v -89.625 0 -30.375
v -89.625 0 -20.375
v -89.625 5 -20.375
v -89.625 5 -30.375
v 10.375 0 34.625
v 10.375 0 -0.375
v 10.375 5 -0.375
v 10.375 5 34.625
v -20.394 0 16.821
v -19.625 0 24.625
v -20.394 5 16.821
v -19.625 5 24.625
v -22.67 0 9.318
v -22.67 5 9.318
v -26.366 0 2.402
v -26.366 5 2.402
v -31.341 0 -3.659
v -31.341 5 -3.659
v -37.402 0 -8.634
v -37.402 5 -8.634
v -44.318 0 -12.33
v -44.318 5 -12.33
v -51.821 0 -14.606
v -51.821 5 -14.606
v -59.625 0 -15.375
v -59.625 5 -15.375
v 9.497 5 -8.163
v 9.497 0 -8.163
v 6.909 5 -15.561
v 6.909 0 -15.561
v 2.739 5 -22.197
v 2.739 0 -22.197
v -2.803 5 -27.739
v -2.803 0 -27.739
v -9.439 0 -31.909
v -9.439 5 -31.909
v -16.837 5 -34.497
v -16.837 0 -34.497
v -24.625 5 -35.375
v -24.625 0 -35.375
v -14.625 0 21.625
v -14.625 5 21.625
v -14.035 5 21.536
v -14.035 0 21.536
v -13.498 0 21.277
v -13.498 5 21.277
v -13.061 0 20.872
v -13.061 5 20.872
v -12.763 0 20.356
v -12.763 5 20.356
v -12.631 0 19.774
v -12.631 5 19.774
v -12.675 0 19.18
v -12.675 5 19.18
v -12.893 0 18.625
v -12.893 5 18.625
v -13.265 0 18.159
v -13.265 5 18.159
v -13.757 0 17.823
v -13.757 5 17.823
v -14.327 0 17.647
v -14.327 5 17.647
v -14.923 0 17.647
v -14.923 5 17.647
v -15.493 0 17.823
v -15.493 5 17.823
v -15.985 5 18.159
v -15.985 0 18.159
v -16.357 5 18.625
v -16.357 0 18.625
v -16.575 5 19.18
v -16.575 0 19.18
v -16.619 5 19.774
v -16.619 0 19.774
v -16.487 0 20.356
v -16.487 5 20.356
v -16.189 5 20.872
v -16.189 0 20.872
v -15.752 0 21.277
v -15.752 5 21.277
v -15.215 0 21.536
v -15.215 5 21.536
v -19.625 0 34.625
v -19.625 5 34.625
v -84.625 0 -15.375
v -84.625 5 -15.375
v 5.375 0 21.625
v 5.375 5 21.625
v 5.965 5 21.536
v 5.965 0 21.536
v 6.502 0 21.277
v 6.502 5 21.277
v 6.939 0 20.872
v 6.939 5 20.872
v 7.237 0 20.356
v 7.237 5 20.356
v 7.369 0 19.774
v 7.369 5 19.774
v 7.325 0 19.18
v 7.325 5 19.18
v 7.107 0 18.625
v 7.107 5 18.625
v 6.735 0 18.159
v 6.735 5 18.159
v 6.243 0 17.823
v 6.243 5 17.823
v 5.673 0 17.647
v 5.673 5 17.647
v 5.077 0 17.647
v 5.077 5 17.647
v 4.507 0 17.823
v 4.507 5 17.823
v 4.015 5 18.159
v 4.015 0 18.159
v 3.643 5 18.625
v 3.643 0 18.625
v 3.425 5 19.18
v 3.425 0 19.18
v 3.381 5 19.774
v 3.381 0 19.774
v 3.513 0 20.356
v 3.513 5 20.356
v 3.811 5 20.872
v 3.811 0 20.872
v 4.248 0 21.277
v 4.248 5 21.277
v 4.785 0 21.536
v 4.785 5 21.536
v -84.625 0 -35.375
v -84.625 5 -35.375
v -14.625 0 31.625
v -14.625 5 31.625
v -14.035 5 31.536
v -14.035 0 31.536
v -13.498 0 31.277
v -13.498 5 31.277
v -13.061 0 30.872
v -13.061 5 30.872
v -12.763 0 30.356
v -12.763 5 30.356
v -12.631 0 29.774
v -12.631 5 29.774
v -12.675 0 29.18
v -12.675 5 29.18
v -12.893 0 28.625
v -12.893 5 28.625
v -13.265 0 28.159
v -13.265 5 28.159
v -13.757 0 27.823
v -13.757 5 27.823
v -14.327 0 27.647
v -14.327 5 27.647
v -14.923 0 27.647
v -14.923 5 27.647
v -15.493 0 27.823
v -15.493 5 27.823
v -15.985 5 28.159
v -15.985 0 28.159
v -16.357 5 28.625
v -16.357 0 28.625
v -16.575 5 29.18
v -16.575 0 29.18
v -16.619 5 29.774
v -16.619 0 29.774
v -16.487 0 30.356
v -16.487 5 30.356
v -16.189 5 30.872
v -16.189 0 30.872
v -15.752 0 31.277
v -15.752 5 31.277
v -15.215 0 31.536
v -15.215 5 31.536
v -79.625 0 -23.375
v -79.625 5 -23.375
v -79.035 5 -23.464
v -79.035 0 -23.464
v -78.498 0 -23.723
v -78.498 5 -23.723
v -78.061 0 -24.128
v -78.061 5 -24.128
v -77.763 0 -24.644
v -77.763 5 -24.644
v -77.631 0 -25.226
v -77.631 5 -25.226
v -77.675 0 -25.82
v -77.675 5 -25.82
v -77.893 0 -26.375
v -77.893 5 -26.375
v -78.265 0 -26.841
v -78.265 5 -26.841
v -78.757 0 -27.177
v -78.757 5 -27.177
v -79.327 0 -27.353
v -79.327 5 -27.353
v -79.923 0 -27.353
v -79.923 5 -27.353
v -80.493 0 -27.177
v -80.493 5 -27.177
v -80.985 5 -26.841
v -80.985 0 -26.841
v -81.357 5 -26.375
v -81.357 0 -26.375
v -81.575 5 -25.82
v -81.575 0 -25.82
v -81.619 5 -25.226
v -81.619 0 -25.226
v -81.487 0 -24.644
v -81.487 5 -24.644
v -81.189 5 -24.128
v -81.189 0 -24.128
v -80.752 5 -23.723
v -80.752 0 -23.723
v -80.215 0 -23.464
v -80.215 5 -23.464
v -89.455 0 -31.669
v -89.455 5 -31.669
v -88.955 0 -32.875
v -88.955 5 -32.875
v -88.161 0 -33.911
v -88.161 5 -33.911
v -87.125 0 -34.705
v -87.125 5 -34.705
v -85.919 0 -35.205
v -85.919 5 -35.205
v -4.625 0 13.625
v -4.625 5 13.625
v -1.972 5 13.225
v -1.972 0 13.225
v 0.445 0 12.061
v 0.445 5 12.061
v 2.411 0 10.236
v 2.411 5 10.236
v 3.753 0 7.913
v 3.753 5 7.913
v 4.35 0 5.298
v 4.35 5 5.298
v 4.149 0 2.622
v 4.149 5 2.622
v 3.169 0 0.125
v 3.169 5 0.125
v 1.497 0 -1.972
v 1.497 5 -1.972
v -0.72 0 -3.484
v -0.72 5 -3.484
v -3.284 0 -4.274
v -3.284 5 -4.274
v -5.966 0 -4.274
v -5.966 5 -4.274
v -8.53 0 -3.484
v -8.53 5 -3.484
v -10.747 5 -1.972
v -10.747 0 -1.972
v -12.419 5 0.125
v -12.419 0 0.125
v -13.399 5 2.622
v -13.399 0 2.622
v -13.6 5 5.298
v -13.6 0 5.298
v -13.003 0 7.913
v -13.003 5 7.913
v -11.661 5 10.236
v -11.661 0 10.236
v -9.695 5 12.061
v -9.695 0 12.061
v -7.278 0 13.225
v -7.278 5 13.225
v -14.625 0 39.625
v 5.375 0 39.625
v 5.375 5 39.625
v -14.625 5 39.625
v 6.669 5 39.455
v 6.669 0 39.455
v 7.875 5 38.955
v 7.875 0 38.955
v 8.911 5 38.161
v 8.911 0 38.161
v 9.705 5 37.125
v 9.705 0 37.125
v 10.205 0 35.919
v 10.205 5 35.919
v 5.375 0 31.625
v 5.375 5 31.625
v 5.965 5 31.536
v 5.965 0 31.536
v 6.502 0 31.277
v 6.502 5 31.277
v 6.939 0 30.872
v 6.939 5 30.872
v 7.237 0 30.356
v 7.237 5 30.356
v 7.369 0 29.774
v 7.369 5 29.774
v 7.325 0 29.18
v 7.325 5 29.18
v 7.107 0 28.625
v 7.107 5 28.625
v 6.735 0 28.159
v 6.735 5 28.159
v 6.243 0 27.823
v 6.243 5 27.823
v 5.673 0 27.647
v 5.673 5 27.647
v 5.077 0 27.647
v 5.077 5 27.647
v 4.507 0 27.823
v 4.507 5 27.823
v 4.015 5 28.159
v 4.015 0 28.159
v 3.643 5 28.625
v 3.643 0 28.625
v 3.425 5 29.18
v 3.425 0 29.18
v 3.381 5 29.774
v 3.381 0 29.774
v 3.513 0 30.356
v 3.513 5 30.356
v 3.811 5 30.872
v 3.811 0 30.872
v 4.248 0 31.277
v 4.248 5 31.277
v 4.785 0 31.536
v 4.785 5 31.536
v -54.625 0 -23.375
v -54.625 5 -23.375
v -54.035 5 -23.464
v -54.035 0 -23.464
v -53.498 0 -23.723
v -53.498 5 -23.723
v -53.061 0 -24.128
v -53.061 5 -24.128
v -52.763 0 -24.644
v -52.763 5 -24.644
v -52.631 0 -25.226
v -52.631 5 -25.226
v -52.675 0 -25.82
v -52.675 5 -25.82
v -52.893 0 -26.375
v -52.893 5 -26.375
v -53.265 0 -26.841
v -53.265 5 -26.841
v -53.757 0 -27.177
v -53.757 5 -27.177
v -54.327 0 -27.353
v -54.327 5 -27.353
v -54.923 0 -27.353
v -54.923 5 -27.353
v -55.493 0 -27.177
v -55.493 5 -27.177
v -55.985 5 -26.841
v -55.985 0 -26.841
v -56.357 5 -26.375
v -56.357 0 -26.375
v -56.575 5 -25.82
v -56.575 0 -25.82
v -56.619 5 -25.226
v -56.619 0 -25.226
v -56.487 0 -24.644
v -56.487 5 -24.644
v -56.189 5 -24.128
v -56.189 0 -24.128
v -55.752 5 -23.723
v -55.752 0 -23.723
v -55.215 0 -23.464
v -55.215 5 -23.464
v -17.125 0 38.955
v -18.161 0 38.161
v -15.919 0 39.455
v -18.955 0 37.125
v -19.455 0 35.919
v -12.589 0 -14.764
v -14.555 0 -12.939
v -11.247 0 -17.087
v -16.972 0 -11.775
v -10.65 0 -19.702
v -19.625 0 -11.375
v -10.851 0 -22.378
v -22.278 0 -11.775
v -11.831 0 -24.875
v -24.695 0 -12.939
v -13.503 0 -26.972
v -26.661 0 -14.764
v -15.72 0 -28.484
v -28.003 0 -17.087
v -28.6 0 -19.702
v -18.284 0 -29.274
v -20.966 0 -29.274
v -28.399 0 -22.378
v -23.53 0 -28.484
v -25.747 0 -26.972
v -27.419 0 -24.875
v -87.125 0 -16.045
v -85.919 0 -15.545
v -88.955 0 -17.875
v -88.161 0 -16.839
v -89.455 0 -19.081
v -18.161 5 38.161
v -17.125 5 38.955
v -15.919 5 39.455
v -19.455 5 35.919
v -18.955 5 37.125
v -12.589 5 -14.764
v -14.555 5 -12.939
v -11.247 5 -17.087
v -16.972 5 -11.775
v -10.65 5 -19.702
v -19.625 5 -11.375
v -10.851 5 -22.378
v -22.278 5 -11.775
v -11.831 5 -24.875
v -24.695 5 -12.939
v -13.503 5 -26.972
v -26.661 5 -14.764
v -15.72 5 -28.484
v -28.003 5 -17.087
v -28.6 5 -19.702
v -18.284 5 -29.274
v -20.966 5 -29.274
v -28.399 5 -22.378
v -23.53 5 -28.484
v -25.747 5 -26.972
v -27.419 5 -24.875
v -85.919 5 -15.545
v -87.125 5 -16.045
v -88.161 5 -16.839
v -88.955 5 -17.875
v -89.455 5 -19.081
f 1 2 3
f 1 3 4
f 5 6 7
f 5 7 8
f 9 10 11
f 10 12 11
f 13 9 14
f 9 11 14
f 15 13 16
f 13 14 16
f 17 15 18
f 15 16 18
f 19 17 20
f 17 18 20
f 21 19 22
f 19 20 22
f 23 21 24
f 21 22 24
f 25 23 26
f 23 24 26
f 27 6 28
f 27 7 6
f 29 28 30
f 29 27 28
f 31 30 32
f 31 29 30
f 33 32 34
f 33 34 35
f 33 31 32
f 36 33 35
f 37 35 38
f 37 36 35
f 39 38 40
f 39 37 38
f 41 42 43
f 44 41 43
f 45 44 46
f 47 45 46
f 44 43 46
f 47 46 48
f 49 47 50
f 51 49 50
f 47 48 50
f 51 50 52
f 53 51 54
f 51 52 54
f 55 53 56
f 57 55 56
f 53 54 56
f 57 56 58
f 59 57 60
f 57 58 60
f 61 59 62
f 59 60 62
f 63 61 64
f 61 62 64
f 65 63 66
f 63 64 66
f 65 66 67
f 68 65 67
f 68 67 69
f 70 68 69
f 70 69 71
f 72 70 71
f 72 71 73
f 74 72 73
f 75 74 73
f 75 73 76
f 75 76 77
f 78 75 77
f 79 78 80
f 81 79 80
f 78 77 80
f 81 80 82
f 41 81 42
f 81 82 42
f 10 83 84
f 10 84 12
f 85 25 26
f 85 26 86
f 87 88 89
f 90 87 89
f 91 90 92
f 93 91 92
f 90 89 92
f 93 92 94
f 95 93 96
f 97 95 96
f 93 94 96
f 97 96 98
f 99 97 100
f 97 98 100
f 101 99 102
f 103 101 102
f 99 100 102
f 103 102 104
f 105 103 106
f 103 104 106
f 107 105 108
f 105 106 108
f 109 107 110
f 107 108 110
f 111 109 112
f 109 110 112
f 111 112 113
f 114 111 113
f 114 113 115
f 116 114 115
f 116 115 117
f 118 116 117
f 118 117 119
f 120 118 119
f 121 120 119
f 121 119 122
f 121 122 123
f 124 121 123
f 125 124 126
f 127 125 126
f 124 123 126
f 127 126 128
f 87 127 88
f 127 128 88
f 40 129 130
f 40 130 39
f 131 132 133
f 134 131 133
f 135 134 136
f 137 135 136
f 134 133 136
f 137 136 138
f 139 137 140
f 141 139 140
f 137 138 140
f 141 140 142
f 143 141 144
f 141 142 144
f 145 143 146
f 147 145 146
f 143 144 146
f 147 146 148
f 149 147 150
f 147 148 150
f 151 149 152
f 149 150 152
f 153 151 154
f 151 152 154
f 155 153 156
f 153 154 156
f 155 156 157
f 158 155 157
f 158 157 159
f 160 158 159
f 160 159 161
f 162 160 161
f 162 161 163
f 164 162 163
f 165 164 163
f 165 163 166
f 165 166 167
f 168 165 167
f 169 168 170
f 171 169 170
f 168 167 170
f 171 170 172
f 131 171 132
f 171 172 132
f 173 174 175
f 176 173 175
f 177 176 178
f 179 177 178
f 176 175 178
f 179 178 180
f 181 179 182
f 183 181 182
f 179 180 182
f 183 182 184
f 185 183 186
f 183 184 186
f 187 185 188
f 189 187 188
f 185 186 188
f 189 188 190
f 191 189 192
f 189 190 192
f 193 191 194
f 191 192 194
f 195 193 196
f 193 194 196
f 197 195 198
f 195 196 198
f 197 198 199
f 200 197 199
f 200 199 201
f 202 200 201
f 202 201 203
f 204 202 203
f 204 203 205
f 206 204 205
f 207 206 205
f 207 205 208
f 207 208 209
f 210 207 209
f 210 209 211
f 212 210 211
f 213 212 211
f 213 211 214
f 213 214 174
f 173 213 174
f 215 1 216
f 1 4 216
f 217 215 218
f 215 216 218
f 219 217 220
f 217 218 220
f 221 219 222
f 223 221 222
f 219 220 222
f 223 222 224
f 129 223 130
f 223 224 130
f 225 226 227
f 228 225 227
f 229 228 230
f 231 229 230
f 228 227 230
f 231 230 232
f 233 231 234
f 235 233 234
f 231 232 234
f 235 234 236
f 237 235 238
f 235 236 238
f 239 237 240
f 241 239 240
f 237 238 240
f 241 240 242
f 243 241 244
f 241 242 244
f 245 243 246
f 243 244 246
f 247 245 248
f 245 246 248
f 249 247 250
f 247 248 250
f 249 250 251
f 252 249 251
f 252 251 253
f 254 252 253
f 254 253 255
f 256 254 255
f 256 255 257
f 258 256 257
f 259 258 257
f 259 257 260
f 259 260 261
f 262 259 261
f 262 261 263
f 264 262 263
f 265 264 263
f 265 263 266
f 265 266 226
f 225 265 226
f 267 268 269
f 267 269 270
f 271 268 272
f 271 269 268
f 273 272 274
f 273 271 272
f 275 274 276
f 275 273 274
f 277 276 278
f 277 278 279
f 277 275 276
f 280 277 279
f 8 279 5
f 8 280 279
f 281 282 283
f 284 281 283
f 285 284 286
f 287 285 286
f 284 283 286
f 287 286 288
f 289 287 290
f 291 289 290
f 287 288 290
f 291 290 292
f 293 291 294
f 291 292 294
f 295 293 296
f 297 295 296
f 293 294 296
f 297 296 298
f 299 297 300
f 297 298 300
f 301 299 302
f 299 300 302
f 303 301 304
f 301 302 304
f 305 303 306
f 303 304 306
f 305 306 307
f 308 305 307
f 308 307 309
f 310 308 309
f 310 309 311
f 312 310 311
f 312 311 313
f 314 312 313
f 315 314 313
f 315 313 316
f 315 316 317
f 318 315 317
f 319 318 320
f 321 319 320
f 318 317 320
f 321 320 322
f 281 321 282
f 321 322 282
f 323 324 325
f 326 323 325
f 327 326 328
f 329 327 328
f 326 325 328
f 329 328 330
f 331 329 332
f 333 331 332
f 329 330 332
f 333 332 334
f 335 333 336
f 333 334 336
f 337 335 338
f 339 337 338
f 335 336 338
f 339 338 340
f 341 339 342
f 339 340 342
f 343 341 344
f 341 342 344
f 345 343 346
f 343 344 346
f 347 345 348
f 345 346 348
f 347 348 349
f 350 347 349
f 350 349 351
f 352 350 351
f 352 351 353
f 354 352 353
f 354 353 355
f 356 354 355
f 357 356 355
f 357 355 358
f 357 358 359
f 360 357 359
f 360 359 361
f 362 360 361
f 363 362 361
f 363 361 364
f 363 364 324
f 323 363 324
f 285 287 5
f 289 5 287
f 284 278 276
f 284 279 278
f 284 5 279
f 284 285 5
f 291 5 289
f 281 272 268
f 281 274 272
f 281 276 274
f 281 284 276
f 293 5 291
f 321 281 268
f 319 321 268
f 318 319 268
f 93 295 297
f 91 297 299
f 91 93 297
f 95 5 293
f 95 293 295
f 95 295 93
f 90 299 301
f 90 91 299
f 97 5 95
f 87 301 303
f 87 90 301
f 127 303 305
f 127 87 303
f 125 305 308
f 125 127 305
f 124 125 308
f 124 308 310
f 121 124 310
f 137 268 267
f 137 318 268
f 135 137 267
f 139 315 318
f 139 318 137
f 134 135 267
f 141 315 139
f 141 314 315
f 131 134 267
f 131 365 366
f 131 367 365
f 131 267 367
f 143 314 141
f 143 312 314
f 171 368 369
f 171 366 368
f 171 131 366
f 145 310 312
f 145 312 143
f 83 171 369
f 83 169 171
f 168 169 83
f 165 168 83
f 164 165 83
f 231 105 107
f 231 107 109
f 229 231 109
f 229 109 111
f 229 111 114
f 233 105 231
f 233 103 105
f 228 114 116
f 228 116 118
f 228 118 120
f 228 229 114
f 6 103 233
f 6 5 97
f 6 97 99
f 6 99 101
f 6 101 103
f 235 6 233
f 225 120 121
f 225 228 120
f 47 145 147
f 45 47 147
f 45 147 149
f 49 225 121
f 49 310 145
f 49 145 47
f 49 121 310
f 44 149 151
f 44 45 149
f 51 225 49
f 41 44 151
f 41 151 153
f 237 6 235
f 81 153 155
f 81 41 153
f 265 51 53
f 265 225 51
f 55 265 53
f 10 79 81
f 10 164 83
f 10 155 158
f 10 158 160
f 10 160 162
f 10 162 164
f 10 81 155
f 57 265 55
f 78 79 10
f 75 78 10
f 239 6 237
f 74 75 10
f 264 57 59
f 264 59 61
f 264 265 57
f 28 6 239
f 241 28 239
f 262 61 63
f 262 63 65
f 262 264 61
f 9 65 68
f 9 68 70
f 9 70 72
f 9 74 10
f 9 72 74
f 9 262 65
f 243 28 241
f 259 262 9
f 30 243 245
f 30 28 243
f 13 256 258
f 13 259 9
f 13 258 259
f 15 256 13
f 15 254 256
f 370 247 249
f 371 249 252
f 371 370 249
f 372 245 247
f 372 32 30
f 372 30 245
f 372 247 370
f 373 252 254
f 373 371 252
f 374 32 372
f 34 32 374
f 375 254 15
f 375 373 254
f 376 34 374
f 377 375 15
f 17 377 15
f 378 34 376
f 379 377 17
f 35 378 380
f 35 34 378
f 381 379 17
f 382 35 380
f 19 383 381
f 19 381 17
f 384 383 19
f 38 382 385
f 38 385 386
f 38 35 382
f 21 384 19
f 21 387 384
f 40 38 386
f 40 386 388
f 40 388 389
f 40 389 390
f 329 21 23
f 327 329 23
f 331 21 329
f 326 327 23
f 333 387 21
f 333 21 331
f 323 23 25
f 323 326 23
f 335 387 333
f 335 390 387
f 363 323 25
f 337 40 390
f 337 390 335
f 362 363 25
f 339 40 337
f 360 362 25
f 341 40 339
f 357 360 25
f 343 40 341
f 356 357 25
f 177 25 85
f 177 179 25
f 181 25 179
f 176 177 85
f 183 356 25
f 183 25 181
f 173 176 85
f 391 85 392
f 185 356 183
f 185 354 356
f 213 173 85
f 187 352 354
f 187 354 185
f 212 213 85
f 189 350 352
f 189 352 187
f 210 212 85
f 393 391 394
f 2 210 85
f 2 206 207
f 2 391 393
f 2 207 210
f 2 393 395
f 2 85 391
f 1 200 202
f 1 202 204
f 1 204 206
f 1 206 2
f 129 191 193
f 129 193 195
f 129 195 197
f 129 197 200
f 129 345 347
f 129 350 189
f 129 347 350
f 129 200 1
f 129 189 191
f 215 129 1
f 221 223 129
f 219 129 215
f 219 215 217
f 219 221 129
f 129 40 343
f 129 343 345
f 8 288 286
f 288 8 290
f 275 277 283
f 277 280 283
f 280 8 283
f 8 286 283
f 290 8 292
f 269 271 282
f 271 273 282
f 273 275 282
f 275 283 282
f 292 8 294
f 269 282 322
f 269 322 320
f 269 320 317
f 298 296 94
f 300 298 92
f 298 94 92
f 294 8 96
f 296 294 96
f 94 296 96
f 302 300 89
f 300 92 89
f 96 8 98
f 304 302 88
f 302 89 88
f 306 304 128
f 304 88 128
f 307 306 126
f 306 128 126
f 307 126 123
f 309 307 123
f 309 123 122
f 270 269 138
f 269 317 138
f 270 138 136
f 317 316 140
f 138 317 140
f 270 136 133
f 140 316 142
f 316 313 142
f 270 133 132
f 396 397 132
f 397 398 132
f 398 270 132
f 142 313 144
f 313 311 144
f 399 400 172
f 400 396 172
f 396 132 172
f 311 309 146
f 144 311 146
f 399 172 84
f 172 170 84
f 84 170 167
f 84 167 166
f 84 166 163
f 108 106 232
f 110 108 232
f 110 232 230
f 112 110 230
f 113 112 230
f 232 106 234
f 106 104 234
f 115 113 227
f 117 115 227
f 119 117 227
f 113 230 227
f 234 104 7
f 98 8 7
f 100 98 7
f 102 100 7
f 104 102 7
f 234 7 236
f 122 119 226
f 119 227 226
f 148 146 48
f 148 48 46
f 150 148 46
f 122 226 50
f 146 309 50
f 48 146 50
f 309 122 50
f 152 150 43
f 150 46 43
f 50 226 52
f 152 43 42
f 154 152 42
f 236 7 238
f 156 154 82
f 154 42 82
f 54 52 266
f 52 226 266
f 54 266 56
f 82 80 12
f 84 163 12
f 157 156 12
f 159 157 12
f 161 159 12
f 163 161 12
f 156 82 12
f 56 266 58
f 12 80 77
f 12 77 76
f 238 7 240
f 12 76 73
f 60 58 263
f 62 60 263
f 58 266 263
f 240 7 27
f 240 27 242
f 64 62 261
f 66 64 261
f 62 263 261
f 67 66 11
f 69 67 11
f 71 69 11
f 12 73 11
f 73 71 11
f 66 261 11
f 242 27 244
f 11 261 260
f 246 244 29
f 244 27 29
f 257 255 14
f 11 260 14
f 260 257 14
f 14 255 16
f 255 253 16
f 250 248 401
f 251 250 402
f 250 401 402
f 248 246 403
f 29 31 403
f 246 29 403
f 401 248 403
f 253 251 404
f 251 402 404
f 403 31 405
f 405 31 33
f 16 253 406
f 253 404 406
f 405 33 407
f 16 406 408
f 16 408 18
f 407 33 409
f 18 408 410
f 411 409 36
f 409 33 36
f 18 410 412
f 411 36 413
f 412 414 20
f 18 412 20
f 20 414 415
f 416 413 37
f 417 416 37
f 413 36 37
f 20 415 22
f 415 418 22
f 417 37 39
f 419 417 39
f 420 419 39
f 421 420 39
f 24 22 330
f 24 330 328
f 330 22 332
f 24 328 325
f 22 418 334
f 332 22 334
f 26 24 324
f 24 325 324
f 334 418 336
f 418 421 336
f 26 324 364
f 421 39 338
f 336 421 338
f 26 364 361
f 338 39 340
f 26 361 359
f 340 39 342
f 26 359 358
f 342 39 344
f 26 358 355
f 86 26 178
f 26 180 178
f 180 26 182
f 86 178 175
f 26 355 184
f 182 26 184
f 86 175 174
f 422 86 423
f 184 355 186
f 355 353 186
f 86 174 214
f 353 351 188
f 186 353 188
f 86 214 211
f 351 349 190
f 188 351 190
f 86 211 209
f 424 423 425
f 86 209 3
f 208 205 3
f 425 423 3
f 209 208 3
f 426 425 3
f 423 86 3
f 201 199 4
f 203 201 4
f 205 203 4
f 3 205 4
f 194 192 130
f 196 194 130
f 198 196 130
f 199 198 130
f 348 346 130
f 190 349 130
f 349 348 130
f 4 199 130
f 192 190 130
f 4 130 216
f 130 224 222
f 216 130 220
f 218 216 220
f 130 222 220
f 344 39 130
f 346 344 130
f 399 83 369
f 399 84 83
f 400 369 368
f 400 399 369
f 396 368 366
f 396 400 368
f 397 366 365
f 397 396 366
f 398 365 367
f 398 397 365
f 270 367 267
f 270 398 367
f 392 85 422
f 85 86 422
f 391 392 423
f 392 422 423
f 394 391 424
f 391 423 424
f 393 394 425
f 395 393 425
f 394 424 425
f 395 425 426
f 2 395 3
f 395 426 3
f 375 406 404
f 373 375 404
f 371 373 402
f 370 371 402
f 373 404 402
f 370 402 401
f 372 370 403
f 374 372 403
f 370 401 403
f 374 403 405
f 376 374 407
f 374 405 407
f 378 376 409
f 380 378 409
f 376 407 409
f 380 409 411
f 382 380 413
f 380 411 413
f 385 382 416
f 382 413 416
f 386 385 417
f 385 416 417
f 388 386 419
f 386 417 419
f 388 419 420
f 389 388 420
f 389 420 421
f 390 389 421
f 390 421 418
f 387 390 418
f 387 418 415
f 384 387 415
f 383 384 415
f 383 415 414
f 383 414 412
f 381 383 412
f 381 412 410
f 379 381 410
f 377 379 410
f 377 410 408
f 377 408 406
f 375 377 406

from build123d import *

# Parameters (mm, degrees)
EXTRUDE_1_DEPTH     = 5
FILLET_1_R          = 40
FILLET_2_R          = 5
SKETCH_2_R          = 2
CUT_EXTRUDE_1_DEPTH = 5
FILLET_3_R          = 35
SKETCH_3_R          = 9
CUT_EXTRUDE_2_DEPTH = 99.12125789
SKETCH_4_R          = 2
CUT_EXTRUDE_3_DEPTH = 99.12125789


with BuildPart() as part:
    # 草图1 → 凸台-拉伸1 (new body)
    with BuildSketch(Plane(origin=(0, 0, 0), x_dir=(1, 0, 0), z_dir=(0, 1, 0))):
        Polygon((-89.625, 35.375), (10.375, 35.375), (10.375, -39.625), (-19.625, -39.625), (-19.625, 15.375), (-89.625, 15.375), align=None)
    extrude(amount=EXTRUDE_1_DEPTH)

    # 圆角1
    fillet_1_edges = [part.edges().sort_by_distance(p)[0] for p in [
        (-19.625, 2.5, -15.375),
    ]]
    fillet(fillet_1_edges, radius=FILLET_1_R)

    # 圆角2
    fillet_2_edges = [part.edges().sort_by_distance(p)[0] for p in [
        (-89.625, 2.5, -35.375),
        (10.375, 2.5, 39.625),
        (-19.625, 2.5, 39.625),
        (-89.625, 2.5, -15.375),
    ]]
    fillet(fillet_2_edges, radius=FILLET_2_R)

    # 草图2 → 切除-拉伸1 (cut)
    with BuildSketch(Plane(origin=(0, 5, 0), x_dir=(1, 0, 0), z_dir=(0, 1, 0))):
        with Locations(Location((-14.625, -29.625, 0), (0, 0, 270))):
            Circle(SKETCH_2_R)
        with Locations(Location((5.375, -29.625, 0), (0, 0, 270))):
            Circle(SKETCH_2_R)
        with Locations(Location((5.375, -19.625, 0), (0, 0, 270))):
            Circle(SKETCH_2_R)
        with Locations(Location((-14.625, -19.625, 0), (0, 0, 270))):
            Circle(SKETCH_2_R)
    extrude(amount=-CUT_EXTRUDE_1_DEPTH, mode=Mode.SUBTRACT)

    # 圆角3
    fillet_3_edges = [part.edges().sort_by_distance(p)[0] for p in [
        (10.375, 2.5, -35.375),
    ]]
    fillet(fillet_3_edges, radius=FILLET_3_R)

    # 草图3 → 切除-拉伸2 (cut, through all)
    with BuildSketch(Plane(origin=(0, 5, 0), x_dir=(1, 0, 0), z_dir=(0, 1, 0))):
        with Locations(Location((-19.625, 20.375, 0), (0, 0, 270))):
            Circle(SKETCH_3_R)
        with Locations(Location((-4.625, -4.625, 0), (0, 0, 270))):
            Circle(SKETCH_3_R)
    extrude(amount=-CUT_EXTRUDE_2_DEPTH, mode=Mode.SUBTRACT)

    # 草图4 → 切除-拉伸3 (cut, through all)
    with BuildSketch(Plane(origin=(0, 5, 0), x_dir=(1, 0, 0), z_dir=(0, 1, 0))):
        with Locations(Location((-79.625, 25.375, 0), (0, 0, 270))):
            Circle(SKETCH_4_R)
        with Locations(Location((-54.625, 25.375, 0), (0, 0, 270))):
            Circle(SKETCH_4_R)
    extrude(amount=-CUT_EXTRUDE_3_DEPTH, mode=Mode.SUBTRACT)


solid = part.part
